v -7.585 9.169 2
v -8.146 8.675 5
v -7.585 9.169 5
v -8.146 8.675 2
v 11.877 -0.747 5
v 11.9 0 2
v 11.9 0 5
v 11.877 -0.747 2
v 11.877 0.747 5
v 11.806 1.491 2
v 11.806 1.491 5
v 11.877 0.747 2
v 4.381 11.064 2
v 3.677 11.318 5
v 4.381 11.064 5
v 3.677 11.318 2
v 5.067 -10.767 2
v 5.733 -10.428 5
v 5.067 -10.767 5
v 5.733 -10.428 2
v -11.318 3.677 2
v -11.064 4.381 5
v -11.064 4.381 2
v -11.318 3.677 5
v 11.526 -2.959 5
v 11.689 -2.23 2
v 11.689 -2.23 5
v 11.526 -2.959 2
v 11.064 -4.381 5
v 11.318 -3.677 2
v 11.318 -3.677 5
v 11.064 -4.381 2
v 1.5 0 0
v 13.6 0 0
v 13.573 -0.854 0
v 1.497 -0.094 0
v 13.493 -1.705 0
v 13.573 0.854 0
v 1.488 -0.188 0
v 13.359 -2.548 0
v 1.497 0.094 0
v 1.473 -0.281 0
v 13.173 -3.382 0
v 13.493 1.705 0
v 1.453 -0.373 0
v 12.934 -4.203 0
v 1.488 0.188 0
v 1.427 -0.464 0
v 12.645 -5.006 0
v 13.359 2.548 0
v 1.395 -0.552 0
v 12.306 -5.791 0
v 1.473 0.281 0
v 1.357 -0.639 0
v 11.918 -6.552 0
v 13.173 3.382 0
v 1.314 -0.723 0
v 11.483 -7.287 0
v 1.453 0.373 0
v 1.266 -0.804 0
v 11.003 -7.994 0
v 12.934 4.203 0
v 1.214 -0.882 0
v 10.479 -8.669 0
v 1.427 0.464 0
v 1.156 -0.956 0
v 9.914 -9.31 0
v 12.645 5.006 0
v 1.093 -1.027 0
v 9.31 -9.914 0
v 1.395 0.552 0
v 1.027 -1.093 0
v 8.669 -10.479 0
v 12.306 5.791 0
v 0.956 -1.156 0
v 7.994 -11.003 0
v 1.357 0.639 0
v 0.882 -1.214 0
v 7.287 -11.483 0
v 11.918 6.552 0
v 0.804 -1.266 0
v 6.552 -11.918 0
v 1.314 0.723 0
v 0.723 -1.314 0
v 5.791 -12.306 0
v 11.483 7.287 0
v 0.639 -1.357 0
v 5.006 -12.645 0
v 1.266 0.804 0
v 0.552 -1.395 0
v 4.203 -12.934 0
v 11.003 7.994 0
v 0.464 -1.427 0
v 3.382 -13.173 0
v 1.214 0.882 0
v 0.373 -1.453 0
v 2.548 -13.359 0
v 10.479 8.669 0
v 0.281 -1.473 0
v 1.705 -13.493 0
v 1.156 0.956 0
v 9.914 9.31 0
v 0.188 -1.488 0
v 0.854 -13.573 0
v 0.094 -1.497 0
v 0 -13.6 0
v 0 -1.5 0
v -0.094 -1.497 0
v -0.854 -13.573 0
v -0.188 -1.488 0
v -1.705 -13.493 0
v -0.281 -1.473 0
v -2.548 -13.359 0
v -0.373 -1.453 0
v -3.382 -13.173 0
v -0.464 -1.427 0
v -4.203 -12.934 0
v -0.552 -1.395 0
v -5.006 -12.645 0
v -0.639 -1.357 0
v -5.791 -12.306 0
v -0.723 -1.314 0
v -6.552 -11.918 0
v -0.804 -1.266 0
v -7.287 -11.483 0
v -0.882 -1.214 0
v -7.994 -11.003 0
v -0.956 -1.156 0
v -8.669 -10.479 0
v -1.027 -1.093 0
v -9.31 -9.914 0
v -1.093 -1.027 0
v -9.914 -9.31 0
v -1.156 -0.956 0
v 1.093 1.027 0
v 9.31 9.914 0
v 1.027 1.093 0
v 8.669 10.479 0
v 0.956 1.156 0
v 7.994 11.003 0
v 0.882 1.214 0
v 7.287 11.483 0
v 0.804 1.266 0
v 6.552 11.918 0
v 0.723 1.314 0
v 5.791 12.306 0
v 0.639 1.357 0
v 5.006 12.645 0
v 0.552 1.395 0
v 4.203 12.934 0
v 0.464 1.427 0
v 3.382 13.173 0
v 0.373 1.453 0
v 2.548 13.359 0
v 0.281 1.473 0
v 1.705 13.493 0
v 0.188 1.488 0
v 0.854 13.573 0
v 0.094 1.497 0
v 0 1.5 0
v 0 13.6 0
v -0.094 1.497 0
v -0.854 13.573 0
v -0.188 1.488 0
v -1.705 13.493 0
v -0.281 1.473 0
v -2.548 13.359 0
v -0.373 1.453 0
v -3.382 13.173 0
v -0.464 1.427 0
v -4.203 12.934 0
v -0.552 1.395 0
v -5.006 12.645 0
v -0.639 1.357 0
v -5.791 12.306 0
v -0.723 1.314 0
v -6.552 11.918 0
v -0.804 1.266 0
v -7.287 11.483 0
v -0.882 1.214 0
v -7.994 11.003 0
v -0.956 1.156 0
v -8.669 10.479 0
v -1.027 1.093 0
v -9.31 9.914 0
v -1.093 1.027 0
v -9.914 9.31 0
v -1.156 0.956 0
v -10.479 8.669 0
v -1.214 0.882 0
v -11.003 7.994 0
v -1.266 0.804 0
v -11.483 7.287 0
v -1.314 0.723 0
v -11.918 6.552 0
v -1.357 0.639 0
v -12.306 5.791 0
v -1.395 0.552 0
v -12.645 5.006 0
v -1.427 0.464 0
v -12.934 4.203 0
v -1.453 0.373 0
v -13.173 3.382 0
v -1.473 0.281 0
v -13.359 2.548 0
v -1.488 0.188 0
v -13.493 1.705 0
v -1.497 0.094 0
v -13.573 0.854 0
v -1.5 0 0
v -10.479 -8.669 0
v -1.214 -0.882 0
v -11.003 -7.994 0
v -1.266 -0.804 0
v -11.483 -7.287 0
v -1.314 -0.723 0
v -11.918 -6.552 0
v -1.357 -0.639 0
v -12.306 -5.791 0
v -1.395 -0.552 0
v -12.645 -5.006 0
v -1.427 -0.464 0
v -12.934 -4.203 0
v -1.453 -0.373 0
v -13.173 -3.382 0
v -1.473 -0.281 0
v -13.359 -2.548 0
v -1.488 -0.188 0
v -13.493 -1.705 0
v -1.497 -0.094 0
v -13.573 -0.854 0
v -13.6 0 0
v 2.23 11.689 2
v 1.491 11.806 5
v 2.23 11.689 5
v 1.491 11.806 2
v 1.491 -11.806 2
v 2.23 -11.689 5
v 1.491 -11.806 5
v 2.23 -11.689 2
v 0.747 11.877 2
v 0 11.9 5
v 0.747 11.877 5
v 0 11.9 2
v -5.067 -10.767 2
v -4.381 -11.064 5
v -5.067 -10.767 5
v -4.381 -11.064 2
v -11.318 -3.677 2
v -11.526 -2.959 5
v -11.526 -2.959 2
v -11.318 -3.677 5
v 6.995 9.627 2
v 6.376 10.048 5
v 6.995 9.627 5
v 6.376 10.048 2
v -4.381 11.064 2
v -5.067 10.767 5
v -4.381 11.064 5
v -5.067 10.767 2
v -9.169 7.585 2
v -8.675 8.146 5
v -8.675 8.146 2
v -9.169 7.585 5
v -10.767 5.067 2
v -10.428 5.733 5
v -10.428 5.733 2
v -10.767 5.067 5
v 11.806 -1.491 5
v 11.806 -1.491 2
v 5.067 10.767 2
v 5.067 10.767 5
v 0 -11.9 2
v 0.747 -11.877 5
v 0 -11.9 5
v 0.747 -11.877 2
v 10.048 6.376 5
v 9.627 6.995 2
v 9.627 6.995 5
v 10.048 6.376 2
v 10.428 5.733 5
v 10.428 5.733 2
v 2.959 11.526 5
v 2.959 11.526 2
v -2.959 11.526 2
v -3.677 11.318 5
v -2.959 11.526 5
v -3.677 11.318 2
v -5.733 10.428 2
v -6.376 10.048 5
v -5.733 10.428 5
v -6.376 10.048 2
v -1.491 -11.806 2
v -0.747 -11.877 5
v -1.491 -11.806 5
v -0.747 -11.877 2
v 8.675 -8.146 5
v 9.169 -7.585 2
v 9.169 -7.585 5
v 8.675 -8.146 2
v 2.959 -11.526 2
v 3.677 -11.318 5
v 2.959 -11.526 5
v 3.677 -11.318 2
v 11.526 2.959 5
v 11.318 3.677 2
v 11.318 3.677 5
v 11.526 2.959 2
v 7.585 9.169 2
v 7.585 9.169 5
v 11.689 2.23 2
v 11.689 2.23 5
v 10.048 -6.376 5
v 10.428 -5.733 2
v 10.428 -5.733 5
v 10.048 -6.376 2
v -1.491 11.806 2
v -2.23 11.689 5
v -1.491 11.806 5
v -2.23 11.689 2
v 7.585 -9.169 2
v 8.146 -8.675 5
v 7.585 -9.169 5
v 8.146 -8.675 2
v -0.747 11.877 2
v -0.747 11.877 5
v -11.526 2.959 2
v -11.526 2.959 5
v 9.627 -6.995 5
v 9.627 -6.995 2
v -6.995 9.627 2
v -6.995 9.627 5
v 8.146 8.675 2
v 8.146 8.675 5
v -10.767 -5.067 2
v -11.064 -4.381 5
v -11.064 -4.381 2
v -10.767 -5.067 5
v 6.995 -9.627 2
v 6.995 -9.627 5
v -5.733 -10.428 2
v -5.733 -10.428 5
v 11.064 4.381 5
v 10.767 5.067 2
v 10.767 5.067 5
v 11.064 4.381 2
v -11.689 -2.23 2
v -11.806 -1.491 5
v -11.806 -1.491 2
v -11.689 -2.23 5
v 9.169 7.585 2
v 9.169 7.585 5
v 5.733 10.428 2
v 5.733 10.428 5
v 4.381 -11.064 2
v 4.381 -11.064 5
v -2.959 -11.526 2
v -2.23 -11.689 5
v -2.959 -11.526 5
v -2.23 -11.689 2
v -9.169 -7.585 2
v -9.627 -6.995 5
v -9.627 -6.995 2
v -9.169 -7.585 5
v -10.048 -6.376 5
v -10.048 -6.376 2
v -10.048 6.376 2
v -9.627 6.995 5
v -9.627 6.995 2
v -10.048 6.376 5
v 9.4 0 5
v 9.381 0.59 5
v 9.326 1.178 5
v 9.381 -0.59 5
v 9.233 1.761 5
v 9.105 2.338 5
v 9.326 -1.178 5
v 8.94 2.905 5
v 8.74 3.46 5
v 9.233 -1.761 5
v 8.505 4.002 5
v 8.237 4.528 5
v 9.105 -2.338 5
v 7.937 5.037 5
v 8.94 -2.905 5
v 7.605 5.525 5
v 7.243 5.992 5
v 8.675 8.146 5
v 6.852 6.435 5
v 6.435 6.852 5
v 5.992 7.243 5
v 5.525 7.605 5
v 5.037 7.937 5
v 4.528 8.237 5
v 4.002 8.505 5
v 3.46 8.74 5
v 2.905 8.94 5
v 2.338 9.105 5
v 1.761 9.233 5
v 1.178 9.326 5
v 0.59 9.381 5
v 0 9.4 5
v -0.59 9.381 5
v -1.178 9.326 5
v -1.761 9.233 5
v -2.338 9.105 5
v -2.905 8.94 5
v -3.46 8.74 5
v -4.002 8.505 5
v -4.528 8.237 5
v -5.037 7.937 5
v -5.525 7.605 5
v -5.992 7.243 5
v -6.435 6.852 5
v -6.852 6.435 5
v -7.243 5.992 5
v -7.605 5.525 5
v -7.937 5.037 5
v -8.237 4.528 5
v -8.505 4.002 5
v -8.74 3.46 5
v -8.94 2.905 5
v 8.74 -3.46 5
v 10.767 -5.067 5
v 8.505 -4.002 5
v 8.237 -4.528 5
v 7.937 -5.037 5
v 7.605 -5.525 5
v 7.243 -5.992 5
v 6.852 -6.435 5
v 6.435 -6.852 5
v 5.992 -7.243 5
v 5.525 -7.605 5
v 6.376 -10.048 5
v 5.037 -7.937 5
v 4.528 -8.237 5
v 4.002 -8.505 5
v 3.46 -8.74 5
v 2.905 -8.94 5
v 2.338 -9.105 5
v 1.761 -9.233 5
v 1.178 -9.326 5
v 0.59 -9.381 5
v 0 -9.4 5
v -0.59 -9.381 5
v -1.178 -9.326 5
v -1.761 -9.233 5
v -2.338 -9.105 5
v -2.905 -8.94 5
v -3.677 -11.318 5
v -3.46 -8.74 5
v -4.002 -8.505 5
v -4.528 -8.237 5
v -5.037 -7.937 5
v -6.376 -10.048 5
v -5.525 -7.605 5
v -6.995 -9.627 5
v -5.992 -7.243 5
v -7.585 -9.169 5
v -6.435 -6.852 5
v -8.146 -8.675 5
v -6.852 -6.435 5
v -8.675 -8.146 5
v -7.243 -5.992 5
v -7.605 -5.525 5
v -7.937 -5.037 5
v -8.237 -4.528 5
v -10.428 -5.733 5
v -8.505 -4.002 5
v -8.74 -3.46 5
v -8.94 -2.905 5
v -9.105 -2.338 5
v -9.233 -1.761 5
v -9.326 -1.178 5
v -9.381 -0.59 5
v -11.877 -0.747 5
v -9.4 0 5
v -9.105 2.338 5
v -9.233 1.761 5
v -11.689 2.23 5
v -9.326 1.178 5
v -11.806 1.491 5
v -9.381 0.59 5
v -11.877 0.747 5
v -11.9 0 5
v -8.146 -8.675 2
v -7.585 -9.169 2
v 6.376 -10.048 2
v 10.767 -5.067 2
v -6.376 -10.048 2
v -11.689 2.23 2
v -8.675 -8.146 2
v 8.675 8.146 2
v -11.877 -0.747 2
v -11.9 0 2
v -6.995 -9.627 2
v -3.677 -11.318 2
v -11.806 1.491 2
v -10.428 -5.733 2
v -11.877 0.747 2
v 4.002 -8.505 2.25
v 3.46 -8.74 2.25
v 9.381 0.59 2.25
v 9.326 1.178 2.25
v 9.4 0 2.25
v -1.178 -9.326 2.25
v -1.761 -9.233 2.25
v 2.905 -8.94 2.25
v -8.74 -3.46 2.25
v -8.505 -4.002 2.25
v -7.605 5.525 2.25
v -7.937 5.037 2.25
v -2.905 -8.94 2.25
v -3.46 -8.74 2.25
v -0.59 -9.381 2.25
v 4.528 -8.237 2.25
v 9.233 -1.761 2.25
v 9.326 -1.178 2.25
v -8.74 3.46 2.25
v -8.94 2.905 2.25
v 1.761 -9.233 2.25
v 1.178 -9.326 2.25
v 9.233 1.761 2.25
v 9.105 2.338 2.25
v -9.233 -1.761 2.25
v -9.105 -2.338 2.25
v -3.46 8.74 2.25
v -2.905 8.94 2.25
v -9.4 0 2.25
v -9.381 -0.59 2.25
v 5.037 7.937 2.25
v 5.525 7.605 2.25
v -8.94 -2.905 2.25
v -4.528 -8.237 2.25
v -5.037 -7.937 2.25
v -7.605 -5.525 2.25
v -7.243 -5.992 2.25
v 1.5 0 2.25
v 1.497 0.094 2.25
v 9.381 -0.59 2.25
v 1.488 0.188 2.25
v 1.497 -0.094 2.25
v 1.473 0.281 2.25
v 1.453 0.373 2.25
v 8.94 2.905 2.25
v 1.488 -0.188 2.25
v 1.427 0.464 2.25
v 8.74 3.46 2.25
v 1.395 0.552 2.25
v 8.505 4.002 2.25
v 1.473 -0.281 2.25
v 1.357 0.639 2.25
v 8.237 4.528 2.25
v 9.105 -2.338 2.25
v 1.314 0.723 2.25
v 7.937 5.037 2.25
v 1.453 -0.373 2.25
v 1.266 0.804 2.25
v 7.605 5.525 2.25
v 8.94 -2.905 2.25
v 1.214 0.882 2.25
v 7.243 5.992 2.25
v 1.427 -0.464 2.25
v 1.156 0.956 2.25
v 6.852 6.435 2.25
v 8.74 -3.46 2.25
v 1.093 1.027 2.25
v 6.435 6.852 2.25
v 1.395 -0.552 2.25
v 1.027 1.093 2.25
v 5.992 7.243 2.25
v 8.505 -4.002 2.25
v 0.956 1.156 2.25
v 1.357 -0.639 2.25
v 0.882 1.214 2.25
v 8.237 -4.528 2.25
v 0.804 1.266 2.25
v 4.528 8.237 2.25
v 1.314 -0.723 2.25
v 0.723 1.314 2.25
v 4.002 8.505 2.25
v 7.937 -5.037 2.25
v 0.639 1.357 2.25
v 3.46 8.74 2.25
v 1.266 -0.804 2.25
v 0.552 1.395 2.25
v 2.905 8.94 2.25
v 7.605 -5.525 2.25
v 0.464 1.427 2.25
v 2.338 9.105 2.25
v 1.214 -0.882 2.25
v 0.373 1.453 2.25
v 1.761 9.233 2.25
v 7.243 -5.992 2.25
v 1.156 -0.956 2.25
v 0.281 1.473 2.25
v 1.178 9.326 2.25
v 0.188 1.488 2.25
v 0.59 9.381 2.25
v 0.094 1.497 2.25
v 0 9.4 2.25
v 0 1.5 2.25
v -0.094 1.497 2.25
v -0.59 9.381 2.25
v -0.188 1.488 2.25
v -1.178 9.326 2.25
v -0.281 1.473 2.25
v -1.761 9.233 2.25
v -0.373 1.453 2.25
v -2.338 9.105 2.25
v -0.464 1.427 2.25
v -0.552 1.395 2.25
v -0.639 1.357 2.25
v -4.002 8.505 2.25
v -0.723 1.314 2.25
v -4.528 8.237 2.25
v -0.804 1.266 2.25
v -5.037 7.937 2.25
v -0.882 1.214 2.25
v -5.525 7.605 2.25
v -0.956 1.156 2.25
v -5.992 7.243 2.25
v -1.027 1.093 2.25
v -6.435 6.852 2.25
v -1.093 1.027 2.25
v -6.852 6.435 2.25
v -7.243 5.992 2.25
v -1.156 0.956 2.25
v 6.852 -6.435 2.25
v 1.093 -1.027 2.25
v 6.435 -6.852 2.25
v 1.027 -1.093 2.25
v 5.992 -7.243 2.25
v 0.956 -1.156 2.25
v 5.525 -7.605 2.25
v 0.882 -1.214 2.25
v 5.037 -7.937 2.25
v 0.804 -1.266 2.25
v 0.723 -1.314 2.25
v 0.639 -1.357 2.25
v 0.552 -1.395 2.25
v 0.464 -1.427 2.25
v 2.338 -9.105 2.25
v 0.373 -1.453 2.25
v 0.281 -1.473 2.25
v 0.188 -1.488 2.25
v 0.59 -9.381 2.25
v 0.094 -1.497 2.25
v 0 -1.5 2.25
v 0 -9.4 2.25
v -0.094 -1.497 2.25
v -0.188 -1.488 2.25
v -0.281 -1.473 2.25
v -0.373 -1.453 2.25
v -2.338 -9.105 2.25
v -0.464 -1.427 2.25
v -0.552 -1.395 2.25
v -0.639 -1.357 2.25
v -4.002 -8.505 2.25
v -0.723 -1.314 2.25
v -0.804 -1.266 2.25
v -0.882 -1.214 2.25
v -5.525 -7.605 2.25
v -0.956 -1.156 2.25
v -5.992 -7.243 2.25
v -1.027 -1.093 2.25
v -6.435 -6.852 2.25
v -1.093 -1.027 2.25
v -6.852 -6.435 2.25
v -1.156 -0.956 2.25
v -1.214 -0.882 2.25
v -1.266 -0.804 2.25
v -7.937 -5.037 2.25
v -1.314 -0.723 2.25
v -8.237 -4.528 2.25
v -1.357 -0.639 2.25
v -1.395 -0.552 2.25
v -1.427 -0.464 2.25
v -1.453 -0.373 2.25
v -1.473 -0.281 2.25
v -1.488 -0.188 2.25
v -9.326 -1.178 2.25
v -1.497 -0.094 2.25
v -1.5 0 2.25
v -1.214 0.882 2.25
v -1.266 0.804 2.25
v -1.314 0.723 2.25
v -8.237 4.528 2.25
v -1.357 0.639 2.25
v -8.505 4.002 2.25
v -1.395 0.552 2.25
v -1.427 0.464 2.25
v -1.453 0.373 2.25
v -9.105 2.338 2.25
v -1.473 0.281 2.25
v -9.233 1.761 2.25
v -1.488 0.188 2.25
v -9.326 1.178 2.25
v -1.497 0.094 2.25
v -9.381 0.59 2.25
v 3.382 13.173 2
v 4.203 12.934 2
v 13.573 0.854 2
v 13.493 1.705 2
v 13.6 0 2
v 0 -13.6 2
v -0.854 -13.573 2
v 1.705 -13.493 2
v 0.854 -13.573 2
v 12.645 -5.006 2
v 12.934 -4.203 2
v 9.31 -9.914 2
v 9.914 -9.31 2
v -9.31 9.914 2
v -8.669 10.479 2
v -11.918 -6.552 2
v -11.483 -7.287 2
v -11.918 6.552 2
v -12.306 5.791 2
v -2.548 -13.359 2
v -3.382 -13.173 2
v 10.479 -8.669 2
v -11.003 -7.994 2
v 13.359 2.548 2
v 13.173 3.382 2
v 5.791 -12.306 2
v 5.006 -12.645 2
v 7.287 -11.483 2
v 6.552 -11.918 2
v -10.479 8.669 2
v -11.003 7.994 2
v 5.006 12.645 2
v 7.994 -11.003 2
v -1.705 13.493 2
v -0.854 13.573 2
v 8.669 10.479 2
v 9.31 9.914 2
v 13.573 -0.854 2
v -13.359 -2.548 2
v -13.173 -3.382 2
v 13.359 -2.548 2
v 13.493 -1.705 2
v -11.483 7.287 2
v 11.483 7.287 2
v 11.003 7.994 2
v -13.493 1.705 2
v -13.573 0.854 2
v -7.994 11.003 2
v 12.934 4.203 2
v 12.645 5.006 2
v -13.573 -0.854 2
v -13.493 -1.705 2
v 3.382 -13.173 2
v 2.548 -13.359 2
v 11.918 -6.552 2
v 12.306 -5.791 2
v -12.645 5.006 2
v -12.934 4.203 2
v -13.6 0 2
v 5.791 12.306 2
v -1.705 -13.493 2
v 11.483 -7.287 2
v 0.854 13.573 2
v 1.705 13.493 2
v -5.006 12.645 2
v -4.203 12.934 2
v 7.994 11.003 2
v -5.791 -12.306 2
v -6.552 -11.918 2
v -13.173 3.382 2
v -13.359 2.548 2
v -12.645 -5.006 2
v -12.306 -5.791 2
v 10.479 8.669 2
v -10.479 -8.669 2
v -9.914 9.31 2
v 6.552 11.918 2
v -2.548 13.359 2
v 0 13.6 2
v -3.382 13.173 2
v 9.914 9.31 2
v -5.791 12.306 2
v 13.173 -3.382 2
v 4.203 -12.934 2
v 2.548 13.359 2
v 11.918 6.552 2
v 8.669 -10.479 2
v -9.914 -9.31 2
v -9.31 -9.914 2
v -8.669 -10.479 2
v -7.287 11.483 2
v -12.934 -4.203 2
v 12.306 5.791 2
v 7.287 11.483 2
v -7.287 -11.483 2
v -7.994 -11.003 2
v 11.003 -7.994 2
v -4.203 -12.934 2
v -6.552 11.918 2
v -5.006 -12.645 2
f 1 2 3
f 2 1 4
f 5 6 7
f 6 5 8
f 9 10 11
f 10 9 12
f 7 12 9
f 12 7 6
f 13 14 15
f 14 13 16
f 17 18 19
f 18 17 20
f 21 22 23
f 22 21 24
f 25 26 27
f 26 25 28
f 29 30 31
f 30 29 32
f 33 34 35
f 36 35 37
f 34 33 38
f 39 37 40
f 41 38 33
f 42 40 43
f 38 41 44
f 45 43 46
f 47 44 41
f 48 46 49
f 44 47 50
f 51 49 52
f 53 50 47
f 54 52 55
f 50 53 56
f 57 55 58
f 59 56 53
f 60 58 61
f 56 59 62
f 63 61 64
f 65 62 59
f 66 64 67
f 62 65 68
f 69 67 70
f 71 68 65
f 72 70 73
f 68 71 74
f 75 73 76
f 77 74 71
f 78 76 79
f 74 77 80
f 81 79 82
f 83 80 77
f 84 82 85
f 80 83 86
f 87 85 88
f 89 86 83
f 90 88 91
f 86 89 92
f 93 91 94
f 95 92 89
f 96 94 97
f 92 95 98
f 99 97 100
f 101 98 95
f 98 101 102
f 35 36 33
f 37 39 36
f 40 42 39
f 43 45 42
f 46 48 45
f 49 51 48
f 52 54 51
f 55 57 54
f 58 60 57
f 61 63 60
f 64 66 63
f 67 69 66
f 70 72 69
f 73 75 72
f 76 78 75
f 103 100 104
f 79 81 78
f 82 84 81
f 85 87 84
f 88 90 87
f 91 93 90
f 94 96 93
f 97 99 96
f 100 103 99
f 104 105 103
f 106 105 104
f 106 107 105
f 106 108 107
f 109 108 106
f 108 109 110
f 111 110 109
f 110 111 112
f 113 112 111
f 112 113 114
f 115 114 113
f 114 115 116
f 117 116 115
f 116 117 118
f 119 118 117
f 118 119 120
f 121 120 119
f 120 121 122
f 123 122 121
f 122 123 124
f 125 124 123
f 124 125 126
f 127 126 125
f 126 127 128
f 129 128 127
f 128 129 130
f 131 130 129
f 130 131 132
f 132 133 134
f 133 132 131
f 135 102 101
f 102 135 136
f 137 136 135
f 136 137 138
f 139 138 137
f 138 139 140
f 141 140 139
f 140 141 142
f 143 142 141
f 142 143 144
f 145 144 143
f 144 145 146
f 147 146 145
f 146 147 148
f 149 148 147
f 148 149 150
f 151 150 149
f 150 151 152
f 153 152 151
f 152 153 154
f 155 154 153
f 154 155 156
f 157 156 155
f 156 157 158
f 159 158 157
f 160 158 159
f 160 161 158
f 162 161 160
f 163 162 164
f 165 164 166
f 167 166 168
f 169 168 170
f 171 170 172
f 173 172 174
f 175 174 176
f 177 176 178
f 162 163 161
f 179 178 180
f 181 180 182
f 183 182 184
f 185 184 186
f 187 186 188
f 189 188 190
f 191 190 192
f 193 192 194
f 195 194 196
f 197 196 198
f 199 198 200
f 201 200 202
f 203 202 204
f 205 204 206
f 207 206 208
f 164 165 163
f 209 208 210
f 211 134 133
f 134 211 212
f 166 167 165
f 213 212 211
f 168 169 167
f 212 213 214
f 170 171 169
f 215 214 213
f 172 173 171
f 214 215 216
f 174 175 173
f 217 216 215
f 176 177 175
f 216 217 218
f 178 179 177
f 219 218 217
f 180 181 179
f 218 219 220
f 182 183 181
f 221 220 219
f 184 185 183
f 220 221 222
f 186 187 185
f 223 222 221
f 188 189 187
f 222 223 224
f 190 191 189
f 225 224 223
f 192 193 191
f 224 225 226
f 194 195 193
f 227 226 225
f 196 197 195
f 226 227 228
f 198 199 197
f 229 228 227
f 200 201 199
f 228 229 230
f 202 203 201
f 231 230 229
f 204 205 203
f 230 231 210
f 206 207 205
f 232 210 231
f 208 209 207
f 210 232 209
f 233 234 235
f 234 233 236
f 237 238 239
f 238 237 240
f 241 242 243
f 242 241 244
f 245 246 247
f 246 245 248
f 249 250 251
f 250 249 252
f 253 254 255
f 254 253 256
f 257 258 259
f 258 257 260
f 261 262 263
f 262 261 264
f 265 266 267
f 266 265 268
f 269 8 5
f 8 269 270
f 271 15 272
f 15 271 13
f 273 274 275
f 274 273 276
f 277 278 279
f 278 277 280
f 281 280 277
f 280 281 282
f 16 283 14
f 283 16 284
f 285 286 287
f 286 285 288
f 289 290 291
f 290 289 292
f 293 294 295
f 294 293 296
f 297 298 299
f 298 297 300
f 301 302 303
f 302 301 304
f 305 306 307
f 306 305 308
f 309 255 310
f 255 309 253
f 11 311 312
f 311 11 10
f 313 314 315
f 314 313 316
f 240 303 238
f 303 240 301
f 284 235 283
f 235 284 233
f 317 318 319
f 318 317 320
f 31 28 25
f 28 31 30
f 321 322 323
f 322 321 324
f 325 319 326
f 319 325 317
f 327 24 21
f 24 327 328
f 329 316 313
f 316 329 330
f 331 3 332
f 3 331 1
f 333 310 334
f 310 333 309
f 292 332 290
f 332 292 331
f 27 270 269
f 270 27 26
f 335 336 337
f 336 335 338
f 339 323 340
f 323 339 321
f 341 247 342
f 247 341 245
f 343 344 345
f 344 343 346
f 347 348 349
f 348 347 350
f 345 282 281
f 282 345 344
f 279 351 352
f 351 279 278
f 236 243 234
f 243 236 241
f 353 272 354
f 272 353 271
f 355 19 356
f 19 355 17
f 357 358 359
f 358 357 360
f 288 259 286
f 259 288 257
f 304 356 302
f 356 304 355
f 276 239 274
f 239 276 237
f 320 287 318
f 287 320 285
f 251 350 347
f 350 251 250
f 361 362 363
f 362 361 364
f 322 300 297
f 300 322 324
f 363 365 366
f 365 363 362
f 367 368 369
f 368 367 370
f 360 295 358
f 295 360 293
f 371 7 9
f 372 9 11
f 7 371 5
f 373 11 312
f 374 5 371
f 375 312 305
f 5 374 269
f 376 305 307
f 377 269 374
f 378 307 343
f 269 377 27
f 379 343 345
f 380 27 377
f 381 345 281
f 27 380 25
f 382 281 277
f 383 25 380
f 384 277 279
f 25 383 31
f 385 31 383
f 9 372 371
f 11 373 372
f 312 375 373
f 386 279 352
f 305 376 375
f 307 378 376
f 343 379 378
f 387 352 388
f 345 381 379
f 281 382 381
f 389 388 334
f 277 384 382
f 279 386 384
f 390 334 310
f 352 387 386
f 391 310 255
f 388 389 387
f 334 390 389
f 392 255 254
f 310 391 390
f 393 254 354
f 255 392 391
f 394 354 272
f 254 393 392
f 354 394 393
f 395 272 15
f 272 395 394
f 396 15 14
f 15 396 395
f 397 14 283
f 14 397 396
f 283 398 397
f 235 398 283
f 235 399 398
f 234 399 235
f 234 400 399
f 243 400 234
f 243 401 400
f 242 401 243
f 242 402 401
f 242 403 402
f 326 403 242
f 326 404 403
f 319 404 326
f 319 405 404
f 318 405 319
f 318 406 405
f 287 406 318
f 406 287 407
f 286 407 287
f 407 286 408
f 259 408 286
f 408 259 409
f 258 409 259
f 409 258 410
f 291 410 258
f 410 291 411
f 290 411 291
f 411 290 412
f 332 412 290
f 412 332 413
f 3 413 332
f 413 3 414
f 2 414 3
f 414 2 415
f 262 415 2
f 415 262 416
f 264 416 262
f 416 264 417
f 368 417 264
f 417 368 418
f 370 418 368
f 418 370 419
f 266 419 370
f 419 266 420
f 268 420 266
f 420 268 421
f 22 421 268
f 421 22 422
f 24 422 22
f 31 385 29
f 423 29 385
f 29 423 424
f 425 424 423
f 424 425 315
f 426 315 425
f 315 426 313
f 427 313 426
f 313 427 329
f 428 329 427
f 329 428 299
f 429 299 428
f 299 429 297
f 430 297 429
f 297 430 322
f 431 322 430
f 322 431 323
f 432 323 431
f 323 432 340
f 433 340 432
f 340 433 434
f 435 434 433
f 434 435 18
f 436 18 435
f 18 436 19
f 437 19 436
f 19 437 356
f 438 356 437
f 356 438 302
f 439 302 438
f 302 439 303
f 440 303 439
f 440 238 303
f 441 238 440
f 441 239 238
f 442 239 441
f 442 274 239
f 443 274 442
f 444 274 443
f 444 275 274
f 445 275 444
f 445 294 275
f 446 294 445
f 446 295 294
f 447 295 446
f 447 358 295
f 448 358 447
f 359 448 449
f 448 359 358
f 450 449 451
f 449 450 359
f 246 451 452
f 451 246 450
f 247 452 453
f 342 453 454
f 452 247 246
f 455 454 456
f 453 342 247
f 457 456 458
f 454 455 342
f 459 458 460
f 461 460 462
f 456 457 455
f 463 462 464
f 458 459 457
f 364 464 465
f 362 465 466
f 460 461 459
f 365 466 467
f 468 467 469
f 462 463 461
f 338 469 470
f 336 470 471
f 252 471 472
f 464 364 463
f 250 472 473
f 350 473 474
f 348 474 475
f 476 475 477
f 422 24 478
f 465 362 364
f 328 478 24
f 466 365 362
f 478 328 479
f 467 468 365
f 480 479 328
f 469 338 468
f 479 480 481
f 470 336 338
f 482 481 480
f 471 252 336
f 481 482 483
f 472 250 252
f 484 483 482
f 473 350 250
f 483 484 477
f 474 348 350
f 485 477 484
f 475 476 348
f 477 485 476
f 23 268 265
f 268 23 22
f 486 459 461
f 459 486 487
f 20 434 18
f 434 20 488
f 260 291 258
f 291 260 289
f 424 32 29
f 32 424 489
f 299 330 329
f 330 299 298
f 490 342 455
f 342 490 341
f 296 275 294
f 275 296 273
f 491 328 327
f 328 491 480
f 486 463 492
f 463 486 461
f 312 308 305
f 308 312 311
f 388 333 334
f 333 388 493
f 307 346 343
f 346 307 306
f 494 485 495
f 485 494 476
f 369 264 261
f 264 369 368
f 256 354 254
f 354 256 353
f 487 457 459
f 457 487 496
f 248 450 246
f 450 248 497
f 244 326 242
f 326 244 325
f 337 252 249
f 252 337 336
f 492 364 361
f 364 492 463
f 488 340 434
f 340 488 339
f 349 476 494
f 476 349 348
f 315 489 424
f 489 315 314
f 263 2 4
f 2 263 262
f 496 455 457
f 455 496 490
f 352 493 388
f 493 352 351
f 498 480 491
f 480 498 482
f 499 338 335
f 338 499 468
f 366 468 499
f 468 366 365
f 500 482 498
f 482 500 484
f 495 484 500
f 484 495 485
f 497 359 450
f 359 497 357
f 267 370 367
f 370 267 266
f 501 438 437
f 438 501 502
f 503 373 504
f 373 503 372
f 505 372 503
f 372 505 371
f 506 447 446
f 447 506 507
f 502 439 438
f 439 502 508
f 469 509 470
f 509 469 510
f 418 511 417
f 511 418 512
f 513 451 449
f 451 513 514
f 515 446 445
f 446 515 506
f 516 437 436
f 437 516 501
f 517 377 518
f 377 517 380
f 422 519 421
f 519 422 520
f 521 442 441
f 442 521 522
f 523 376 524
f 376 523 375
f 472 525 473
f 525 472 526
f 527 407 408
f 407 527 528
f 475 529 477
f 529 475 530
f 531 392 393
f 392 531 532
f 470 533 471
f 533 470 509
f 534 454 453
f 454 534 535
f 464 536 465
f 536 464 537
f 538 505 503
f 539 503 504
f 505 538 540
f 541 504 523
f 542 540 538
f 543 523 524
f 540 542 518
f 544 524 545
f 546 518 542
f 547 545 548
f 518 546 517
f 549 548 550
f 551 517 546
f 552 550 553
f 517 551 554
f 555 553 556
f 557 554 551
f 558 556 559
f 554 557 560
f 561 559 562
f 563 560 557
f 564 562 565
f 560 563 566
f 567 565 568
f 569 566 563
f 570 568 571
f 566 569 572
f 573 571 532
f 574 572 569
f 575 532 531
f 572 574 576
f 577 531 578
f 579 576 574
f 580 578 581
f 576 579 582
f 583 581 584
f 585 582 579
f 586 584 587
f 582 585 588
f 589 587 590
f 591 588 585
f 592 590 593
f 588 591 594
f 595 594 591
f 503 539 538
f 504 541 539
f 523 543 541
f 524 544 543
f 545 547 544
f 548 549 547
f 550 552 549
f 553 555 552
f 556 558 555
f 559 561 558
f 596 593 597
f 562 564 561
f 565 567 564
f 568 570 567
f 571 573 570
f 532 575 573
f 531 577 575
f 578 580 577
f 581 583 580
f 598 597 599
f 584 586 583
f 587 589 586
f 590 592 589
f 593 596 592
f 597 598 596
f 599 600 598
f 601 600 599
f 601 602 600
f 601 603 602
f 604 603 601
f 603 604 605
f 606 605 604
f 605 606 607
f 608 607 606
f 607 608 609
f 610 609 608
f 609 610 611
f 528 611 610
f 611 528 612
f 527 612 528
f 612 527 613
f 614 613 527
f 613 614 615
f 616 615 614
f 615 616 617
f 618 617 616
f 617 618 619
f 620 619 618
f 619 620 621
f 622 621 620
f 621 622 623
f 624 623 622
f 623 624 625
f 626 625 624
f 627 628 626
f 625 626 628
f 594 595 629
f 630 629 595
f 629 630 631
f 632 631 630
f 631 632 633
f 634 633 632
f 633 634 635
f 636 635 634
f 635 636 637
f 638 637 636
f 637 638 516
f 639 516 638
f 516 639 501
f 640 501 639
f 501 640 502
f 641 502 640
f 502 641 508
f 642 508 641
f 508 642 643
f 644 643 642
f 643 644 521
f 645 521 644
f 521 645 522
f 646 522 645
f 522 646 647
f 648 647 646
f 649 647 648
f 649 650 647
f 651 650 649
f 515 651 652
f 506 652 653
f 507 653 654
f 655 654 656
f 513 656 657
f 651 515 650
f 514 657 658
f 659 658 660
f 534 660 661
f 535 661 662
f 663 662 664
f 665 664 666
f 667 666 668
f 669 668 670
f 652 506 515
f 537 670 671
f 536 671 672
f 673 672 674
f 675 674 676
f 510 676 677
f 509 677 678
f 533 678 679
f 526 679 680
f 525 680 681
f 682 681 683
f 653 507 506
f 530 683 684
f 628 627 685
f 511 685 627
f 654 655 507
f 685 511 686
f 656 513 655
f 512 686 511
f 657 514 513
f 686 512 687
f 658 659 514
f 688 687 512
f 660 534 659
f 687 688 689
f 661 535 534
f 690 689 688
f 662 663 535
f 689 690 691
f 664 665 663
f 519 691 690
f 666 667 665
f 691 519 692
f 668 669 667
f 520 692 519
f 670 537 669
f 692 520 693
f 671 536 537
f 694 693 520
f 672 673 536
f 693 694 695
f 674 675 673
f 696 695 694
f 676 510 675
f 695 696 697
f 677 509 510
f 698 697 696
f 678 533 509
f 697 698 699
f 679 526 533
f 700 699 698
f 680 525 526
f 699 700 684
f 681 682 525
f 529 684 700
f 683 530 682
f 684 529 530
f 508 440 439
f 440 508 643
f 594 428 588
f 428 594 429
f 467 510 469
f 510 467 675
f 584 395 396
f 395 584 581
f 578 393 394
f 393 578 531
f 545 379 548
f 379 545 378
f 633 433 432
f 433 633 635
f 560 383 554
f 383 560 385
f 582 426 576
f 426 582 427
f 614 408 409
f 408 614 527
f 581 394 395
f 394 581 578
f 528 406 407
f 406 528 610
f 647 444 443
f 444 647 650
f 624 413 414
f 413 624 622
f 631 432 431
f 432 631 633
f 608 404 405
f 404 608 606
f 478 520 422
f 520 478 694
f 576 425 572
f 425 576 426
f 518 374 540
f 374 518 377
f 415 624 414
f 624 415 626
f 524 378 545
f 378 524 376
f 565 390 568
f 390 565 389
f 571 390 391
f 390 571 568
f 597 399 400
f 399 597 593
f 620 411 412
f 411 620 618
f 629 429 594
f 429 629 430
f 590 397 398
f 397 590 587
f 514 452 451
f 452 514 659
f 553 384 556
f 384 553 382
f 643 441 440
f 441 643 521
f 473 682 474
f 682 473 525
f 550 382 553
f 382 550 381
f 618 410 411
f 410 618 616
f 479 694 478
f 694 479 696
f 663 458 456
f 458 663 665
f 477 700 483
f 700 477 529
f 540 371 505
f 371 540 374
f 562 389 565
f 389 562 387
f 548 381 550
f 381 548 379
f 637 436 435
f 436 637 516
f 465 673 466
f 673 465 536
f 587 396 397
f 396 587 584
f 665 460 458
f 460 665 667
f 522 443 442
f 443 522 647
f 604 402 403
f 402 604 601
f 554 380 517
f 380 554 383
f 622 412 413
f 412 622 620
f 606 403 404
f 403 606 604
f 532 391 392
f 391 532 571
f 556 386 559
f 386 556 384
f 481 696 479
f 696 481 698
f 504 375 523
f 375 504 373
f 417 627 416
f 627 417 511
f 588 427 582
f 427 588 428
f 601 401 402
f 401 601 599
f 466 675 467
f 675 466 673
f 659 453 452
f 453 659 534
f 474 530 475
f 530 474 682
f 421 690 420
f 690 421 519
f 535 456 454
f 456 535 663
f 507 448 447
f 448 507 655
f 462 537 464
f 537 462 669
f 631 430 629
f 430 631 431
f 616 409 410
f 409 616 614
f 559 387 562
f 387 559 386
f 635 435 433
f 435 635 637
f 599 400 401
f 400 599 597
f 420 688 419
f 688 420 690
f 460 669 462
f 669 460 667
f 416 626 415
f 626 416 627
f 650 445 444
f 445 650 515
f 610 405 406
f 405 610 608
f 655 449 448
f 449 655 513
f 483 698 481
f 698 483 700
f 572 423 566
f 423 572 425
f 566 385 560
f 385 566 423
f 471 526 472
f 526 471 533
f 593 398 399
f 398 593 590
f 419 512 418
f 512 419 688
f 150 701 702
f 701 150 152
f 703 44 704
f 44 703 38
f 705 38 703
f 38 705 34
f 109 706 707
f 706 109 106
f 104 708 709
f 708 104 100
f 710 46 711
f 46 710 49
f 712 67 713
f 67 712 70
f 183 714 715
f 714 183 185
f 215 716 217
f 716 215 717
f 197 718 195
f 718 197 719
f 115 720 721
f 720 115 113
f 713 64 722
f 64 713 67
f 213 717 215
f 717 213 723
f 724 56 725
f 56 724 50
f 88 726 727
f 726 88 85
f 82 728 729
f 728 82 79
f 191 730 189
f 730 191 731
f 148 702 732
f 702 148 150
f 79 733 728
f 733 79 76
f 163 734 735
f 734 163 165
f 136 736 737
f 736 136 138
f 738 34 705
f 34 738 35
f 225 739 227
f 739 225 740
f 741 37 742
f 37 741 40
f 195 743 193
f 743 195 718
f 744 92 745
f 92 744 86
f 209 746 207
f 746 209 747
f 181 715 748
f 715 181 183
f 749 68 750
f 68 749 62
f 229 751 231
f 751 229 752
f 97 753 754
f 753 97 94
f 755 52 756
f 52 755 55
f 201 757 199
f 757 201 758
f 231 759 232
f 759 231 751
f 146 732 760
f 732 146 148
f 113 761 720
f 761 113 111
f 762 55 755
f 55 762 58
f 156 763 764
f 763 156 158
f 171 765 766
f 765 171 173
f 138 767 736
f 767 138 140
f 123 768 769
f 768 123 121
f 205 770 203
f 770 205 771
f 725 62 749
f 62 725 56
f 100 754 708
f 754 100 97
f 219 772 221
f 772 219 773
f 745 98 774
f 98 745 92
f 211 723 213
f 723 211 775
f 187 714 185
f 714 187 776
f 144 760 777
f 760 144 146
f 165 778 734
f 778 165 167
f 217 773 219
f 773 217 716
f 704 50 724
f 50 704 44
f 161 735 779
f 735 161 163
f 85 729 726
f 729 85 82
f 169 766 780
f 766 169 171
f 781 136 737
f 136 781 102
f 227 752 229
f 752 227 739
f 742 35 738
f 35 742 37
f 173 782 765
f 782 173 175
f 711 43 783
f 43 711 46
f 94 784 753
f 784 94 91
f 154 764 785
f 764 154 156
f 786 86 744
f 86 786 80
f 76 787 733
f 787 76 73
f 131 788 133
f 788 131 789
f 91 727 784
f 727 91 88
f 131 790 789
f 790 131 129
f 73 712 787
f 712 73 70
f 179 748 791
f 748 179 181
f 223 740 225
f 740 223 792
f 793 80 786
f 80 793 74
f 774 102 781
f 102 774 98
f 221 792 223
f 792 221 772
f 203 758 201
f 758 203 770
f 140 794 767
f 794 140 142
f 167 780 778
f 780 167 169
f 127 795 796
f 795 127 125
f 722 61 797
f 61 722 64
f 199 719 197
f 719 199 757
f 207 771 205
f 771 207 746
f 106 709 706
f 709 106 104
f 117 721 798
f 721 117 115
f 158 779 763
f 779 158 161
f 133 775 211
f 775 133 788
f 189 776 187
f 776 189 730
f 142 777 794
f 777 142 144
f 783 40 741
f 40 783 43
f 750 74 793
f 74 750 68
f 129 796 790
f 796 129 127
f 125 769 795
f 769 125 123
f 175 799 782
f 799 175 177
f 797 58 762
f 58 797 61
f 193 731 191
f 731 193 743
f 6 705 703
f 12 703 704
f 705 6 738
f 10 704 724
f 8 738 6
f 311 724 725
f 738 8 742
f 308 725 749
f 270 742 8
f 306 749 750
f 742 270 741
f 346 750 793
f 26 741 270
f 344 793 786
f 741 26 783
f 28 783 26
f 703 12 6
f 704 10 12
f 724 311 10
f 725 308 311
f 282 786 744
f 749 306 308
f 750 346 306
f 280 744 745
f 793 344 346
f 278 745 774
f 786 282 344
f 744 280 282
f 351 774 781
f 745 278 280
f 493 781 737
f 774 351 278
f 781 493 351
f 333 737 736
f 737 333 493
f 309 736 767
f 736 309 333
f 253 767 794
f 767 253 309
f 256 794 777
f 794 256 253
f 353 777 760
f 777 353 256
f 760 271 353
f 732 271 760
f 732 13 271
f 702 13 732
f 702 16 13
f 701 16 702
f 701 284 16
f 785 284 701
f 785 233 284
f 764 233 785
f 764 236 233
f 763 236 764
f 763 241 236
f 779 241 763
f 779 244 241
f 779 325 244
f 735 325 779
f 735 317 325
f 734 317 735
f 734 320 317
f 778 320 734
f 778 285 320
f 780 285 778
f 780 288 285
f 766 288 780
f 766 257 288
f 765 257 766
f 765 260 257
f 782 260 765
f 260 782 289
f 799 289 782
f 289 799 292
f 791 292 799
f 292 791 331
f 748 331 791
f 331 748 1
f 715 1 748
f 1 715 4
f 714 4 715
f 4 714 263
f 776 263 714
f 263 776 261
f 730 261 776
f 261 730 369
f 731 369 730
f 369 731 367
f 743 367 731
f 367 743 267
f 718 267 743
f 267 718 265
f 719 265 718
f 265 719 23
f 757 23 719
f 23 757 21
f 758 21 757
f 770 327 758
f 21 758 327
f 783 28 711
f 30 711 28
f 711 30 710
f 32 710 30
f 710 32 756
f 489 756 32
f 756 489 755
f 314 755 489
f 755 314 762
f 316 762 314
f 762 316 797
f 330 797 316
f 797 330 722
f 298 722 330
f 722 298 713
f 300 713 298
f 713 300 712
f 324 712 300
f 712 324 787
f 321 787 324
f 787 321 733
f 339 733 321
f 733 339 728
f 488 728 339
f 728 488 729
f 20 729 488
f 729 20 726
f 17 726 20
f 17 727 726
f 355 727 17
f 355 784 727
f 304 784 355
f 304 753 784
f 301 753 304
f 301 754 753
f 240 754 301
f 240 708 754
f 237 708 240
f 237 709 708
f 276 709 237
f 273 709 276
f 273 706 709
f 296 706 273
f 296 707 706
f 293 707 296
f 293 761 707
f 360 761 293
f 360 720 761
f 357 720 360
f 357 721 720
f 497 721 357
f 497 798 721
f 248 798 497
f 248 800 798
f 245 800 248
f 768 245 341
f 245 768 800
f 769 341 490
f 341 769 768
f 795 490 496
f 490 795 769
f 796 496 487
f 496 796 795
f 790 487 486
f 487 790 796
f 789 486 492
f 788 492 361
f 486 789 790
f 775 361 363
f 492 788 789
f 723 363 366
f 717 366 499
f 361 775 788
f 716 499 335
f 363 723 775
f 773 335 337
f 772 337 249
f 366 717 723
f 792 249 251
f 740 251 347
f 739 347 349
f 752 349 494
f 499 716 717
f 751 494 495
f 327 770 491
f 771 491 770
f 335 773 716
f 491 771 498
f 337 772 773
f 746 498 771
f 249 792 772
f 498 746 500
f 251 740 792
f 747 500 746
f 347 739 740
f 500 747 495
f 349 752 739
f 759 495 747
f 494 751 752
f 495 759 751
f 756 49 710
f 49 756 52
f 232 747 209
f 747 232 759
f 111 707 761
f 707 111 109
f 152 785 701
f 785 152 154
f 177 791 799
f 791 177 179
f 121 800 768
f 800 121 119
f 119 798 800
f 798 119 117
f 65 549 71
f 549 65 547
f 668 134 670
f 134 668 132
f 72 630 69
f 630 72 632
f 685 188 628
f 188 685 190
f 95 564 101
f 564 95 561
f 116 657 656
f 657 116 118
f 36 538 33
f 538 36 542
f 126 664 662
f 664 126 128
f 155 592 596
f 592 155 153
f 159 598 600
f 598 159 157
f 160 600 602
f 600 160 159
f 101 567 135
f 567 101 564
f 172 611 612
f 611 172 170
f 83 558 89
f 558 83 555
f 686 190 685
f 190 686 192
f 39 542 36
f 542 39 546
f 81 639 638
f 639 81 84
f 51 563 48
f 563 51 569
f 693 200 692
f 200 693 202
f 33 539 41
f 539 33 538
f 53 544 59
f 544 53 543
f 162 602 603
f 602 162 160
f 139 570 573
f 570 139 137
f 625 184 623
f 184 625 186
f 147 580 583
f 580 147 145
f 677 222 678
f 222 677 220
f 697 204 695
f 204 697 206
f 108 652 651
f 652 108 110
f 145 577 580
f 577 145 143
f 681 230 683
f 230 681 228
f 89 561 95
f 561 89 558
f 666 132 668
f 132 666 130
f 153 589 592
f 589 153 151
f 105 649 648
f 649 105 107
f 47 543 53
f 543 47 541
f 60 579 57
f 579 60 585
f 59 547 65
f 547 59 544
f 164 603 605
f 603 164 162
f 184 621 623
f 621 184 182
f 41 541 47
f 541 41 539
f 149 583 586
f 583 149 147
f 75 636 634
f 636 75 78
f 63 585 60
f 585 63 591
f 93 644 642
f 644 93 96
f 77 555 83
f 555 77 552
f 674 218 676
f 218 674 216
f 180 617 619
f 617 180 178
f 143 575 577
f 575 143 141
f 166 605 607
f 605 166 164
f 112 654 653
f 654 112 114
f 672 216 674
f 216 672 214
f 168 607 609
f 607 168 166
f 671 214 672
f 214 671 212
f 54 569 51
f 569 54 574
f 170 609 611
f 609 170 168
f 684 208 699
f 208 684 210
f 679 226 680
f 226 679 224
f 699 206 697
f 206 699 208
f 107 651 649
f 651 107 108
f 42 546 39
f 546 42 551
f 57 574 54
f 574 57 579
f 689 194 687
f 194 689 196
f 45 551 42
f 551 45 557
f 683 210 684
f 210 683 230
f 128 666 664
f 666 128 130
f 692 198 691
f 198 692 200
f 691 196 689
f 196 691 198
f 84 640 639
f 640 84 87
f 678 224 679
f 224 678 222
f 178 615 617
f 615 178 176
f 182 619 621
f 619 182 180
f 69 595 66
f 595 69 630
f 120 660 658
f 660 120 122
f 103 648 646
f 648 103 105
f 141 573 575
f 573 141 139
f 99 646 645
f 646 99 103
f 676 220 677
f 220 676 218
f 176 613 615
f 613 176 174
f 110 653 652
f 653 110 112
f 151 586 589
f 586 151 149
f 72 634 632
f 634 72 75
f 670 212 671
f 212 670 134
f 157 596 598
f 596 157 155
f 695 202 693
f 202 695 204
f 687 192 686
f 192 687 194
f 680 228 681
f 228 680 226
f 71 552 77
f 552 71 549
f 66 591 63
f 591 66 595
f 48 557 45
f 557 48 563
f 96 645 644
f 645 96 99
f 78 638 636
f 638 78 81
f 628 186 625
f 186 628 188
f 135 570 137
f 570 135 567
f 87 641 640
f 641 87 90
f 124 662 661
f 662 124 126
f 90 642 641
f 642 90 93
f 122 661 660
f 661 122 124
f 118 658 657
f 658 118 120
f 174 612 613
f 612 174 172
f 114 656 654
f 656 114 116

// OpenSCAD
$fn=100;


// all measurements in mm
innerDiameter = 23.8;
wallThickenss = 0.7;
fudgeFactor = 0.25;
outerDiameter = innerDiameter + 2 * (wallThickenss + 1);
lidDepth = 2;
insertDepth = 3;
totalDepth = lidDepth + insertDepth;

ventDiameter = 3;

// lid top

difference() {

union() {
cylinder (lidDepth, d = outerDiameter);

difference() {
cylinder (totalDepth , 
            d = innerDiameter);
translate([0,0,lidDepth + fudgeFactor])
cylinder (insertDepth , d = innerDiameter - 5);
}
}


translate([0,0, -0.5])
cylinder (lidDepth + 1, d = ventDiameter);

}
